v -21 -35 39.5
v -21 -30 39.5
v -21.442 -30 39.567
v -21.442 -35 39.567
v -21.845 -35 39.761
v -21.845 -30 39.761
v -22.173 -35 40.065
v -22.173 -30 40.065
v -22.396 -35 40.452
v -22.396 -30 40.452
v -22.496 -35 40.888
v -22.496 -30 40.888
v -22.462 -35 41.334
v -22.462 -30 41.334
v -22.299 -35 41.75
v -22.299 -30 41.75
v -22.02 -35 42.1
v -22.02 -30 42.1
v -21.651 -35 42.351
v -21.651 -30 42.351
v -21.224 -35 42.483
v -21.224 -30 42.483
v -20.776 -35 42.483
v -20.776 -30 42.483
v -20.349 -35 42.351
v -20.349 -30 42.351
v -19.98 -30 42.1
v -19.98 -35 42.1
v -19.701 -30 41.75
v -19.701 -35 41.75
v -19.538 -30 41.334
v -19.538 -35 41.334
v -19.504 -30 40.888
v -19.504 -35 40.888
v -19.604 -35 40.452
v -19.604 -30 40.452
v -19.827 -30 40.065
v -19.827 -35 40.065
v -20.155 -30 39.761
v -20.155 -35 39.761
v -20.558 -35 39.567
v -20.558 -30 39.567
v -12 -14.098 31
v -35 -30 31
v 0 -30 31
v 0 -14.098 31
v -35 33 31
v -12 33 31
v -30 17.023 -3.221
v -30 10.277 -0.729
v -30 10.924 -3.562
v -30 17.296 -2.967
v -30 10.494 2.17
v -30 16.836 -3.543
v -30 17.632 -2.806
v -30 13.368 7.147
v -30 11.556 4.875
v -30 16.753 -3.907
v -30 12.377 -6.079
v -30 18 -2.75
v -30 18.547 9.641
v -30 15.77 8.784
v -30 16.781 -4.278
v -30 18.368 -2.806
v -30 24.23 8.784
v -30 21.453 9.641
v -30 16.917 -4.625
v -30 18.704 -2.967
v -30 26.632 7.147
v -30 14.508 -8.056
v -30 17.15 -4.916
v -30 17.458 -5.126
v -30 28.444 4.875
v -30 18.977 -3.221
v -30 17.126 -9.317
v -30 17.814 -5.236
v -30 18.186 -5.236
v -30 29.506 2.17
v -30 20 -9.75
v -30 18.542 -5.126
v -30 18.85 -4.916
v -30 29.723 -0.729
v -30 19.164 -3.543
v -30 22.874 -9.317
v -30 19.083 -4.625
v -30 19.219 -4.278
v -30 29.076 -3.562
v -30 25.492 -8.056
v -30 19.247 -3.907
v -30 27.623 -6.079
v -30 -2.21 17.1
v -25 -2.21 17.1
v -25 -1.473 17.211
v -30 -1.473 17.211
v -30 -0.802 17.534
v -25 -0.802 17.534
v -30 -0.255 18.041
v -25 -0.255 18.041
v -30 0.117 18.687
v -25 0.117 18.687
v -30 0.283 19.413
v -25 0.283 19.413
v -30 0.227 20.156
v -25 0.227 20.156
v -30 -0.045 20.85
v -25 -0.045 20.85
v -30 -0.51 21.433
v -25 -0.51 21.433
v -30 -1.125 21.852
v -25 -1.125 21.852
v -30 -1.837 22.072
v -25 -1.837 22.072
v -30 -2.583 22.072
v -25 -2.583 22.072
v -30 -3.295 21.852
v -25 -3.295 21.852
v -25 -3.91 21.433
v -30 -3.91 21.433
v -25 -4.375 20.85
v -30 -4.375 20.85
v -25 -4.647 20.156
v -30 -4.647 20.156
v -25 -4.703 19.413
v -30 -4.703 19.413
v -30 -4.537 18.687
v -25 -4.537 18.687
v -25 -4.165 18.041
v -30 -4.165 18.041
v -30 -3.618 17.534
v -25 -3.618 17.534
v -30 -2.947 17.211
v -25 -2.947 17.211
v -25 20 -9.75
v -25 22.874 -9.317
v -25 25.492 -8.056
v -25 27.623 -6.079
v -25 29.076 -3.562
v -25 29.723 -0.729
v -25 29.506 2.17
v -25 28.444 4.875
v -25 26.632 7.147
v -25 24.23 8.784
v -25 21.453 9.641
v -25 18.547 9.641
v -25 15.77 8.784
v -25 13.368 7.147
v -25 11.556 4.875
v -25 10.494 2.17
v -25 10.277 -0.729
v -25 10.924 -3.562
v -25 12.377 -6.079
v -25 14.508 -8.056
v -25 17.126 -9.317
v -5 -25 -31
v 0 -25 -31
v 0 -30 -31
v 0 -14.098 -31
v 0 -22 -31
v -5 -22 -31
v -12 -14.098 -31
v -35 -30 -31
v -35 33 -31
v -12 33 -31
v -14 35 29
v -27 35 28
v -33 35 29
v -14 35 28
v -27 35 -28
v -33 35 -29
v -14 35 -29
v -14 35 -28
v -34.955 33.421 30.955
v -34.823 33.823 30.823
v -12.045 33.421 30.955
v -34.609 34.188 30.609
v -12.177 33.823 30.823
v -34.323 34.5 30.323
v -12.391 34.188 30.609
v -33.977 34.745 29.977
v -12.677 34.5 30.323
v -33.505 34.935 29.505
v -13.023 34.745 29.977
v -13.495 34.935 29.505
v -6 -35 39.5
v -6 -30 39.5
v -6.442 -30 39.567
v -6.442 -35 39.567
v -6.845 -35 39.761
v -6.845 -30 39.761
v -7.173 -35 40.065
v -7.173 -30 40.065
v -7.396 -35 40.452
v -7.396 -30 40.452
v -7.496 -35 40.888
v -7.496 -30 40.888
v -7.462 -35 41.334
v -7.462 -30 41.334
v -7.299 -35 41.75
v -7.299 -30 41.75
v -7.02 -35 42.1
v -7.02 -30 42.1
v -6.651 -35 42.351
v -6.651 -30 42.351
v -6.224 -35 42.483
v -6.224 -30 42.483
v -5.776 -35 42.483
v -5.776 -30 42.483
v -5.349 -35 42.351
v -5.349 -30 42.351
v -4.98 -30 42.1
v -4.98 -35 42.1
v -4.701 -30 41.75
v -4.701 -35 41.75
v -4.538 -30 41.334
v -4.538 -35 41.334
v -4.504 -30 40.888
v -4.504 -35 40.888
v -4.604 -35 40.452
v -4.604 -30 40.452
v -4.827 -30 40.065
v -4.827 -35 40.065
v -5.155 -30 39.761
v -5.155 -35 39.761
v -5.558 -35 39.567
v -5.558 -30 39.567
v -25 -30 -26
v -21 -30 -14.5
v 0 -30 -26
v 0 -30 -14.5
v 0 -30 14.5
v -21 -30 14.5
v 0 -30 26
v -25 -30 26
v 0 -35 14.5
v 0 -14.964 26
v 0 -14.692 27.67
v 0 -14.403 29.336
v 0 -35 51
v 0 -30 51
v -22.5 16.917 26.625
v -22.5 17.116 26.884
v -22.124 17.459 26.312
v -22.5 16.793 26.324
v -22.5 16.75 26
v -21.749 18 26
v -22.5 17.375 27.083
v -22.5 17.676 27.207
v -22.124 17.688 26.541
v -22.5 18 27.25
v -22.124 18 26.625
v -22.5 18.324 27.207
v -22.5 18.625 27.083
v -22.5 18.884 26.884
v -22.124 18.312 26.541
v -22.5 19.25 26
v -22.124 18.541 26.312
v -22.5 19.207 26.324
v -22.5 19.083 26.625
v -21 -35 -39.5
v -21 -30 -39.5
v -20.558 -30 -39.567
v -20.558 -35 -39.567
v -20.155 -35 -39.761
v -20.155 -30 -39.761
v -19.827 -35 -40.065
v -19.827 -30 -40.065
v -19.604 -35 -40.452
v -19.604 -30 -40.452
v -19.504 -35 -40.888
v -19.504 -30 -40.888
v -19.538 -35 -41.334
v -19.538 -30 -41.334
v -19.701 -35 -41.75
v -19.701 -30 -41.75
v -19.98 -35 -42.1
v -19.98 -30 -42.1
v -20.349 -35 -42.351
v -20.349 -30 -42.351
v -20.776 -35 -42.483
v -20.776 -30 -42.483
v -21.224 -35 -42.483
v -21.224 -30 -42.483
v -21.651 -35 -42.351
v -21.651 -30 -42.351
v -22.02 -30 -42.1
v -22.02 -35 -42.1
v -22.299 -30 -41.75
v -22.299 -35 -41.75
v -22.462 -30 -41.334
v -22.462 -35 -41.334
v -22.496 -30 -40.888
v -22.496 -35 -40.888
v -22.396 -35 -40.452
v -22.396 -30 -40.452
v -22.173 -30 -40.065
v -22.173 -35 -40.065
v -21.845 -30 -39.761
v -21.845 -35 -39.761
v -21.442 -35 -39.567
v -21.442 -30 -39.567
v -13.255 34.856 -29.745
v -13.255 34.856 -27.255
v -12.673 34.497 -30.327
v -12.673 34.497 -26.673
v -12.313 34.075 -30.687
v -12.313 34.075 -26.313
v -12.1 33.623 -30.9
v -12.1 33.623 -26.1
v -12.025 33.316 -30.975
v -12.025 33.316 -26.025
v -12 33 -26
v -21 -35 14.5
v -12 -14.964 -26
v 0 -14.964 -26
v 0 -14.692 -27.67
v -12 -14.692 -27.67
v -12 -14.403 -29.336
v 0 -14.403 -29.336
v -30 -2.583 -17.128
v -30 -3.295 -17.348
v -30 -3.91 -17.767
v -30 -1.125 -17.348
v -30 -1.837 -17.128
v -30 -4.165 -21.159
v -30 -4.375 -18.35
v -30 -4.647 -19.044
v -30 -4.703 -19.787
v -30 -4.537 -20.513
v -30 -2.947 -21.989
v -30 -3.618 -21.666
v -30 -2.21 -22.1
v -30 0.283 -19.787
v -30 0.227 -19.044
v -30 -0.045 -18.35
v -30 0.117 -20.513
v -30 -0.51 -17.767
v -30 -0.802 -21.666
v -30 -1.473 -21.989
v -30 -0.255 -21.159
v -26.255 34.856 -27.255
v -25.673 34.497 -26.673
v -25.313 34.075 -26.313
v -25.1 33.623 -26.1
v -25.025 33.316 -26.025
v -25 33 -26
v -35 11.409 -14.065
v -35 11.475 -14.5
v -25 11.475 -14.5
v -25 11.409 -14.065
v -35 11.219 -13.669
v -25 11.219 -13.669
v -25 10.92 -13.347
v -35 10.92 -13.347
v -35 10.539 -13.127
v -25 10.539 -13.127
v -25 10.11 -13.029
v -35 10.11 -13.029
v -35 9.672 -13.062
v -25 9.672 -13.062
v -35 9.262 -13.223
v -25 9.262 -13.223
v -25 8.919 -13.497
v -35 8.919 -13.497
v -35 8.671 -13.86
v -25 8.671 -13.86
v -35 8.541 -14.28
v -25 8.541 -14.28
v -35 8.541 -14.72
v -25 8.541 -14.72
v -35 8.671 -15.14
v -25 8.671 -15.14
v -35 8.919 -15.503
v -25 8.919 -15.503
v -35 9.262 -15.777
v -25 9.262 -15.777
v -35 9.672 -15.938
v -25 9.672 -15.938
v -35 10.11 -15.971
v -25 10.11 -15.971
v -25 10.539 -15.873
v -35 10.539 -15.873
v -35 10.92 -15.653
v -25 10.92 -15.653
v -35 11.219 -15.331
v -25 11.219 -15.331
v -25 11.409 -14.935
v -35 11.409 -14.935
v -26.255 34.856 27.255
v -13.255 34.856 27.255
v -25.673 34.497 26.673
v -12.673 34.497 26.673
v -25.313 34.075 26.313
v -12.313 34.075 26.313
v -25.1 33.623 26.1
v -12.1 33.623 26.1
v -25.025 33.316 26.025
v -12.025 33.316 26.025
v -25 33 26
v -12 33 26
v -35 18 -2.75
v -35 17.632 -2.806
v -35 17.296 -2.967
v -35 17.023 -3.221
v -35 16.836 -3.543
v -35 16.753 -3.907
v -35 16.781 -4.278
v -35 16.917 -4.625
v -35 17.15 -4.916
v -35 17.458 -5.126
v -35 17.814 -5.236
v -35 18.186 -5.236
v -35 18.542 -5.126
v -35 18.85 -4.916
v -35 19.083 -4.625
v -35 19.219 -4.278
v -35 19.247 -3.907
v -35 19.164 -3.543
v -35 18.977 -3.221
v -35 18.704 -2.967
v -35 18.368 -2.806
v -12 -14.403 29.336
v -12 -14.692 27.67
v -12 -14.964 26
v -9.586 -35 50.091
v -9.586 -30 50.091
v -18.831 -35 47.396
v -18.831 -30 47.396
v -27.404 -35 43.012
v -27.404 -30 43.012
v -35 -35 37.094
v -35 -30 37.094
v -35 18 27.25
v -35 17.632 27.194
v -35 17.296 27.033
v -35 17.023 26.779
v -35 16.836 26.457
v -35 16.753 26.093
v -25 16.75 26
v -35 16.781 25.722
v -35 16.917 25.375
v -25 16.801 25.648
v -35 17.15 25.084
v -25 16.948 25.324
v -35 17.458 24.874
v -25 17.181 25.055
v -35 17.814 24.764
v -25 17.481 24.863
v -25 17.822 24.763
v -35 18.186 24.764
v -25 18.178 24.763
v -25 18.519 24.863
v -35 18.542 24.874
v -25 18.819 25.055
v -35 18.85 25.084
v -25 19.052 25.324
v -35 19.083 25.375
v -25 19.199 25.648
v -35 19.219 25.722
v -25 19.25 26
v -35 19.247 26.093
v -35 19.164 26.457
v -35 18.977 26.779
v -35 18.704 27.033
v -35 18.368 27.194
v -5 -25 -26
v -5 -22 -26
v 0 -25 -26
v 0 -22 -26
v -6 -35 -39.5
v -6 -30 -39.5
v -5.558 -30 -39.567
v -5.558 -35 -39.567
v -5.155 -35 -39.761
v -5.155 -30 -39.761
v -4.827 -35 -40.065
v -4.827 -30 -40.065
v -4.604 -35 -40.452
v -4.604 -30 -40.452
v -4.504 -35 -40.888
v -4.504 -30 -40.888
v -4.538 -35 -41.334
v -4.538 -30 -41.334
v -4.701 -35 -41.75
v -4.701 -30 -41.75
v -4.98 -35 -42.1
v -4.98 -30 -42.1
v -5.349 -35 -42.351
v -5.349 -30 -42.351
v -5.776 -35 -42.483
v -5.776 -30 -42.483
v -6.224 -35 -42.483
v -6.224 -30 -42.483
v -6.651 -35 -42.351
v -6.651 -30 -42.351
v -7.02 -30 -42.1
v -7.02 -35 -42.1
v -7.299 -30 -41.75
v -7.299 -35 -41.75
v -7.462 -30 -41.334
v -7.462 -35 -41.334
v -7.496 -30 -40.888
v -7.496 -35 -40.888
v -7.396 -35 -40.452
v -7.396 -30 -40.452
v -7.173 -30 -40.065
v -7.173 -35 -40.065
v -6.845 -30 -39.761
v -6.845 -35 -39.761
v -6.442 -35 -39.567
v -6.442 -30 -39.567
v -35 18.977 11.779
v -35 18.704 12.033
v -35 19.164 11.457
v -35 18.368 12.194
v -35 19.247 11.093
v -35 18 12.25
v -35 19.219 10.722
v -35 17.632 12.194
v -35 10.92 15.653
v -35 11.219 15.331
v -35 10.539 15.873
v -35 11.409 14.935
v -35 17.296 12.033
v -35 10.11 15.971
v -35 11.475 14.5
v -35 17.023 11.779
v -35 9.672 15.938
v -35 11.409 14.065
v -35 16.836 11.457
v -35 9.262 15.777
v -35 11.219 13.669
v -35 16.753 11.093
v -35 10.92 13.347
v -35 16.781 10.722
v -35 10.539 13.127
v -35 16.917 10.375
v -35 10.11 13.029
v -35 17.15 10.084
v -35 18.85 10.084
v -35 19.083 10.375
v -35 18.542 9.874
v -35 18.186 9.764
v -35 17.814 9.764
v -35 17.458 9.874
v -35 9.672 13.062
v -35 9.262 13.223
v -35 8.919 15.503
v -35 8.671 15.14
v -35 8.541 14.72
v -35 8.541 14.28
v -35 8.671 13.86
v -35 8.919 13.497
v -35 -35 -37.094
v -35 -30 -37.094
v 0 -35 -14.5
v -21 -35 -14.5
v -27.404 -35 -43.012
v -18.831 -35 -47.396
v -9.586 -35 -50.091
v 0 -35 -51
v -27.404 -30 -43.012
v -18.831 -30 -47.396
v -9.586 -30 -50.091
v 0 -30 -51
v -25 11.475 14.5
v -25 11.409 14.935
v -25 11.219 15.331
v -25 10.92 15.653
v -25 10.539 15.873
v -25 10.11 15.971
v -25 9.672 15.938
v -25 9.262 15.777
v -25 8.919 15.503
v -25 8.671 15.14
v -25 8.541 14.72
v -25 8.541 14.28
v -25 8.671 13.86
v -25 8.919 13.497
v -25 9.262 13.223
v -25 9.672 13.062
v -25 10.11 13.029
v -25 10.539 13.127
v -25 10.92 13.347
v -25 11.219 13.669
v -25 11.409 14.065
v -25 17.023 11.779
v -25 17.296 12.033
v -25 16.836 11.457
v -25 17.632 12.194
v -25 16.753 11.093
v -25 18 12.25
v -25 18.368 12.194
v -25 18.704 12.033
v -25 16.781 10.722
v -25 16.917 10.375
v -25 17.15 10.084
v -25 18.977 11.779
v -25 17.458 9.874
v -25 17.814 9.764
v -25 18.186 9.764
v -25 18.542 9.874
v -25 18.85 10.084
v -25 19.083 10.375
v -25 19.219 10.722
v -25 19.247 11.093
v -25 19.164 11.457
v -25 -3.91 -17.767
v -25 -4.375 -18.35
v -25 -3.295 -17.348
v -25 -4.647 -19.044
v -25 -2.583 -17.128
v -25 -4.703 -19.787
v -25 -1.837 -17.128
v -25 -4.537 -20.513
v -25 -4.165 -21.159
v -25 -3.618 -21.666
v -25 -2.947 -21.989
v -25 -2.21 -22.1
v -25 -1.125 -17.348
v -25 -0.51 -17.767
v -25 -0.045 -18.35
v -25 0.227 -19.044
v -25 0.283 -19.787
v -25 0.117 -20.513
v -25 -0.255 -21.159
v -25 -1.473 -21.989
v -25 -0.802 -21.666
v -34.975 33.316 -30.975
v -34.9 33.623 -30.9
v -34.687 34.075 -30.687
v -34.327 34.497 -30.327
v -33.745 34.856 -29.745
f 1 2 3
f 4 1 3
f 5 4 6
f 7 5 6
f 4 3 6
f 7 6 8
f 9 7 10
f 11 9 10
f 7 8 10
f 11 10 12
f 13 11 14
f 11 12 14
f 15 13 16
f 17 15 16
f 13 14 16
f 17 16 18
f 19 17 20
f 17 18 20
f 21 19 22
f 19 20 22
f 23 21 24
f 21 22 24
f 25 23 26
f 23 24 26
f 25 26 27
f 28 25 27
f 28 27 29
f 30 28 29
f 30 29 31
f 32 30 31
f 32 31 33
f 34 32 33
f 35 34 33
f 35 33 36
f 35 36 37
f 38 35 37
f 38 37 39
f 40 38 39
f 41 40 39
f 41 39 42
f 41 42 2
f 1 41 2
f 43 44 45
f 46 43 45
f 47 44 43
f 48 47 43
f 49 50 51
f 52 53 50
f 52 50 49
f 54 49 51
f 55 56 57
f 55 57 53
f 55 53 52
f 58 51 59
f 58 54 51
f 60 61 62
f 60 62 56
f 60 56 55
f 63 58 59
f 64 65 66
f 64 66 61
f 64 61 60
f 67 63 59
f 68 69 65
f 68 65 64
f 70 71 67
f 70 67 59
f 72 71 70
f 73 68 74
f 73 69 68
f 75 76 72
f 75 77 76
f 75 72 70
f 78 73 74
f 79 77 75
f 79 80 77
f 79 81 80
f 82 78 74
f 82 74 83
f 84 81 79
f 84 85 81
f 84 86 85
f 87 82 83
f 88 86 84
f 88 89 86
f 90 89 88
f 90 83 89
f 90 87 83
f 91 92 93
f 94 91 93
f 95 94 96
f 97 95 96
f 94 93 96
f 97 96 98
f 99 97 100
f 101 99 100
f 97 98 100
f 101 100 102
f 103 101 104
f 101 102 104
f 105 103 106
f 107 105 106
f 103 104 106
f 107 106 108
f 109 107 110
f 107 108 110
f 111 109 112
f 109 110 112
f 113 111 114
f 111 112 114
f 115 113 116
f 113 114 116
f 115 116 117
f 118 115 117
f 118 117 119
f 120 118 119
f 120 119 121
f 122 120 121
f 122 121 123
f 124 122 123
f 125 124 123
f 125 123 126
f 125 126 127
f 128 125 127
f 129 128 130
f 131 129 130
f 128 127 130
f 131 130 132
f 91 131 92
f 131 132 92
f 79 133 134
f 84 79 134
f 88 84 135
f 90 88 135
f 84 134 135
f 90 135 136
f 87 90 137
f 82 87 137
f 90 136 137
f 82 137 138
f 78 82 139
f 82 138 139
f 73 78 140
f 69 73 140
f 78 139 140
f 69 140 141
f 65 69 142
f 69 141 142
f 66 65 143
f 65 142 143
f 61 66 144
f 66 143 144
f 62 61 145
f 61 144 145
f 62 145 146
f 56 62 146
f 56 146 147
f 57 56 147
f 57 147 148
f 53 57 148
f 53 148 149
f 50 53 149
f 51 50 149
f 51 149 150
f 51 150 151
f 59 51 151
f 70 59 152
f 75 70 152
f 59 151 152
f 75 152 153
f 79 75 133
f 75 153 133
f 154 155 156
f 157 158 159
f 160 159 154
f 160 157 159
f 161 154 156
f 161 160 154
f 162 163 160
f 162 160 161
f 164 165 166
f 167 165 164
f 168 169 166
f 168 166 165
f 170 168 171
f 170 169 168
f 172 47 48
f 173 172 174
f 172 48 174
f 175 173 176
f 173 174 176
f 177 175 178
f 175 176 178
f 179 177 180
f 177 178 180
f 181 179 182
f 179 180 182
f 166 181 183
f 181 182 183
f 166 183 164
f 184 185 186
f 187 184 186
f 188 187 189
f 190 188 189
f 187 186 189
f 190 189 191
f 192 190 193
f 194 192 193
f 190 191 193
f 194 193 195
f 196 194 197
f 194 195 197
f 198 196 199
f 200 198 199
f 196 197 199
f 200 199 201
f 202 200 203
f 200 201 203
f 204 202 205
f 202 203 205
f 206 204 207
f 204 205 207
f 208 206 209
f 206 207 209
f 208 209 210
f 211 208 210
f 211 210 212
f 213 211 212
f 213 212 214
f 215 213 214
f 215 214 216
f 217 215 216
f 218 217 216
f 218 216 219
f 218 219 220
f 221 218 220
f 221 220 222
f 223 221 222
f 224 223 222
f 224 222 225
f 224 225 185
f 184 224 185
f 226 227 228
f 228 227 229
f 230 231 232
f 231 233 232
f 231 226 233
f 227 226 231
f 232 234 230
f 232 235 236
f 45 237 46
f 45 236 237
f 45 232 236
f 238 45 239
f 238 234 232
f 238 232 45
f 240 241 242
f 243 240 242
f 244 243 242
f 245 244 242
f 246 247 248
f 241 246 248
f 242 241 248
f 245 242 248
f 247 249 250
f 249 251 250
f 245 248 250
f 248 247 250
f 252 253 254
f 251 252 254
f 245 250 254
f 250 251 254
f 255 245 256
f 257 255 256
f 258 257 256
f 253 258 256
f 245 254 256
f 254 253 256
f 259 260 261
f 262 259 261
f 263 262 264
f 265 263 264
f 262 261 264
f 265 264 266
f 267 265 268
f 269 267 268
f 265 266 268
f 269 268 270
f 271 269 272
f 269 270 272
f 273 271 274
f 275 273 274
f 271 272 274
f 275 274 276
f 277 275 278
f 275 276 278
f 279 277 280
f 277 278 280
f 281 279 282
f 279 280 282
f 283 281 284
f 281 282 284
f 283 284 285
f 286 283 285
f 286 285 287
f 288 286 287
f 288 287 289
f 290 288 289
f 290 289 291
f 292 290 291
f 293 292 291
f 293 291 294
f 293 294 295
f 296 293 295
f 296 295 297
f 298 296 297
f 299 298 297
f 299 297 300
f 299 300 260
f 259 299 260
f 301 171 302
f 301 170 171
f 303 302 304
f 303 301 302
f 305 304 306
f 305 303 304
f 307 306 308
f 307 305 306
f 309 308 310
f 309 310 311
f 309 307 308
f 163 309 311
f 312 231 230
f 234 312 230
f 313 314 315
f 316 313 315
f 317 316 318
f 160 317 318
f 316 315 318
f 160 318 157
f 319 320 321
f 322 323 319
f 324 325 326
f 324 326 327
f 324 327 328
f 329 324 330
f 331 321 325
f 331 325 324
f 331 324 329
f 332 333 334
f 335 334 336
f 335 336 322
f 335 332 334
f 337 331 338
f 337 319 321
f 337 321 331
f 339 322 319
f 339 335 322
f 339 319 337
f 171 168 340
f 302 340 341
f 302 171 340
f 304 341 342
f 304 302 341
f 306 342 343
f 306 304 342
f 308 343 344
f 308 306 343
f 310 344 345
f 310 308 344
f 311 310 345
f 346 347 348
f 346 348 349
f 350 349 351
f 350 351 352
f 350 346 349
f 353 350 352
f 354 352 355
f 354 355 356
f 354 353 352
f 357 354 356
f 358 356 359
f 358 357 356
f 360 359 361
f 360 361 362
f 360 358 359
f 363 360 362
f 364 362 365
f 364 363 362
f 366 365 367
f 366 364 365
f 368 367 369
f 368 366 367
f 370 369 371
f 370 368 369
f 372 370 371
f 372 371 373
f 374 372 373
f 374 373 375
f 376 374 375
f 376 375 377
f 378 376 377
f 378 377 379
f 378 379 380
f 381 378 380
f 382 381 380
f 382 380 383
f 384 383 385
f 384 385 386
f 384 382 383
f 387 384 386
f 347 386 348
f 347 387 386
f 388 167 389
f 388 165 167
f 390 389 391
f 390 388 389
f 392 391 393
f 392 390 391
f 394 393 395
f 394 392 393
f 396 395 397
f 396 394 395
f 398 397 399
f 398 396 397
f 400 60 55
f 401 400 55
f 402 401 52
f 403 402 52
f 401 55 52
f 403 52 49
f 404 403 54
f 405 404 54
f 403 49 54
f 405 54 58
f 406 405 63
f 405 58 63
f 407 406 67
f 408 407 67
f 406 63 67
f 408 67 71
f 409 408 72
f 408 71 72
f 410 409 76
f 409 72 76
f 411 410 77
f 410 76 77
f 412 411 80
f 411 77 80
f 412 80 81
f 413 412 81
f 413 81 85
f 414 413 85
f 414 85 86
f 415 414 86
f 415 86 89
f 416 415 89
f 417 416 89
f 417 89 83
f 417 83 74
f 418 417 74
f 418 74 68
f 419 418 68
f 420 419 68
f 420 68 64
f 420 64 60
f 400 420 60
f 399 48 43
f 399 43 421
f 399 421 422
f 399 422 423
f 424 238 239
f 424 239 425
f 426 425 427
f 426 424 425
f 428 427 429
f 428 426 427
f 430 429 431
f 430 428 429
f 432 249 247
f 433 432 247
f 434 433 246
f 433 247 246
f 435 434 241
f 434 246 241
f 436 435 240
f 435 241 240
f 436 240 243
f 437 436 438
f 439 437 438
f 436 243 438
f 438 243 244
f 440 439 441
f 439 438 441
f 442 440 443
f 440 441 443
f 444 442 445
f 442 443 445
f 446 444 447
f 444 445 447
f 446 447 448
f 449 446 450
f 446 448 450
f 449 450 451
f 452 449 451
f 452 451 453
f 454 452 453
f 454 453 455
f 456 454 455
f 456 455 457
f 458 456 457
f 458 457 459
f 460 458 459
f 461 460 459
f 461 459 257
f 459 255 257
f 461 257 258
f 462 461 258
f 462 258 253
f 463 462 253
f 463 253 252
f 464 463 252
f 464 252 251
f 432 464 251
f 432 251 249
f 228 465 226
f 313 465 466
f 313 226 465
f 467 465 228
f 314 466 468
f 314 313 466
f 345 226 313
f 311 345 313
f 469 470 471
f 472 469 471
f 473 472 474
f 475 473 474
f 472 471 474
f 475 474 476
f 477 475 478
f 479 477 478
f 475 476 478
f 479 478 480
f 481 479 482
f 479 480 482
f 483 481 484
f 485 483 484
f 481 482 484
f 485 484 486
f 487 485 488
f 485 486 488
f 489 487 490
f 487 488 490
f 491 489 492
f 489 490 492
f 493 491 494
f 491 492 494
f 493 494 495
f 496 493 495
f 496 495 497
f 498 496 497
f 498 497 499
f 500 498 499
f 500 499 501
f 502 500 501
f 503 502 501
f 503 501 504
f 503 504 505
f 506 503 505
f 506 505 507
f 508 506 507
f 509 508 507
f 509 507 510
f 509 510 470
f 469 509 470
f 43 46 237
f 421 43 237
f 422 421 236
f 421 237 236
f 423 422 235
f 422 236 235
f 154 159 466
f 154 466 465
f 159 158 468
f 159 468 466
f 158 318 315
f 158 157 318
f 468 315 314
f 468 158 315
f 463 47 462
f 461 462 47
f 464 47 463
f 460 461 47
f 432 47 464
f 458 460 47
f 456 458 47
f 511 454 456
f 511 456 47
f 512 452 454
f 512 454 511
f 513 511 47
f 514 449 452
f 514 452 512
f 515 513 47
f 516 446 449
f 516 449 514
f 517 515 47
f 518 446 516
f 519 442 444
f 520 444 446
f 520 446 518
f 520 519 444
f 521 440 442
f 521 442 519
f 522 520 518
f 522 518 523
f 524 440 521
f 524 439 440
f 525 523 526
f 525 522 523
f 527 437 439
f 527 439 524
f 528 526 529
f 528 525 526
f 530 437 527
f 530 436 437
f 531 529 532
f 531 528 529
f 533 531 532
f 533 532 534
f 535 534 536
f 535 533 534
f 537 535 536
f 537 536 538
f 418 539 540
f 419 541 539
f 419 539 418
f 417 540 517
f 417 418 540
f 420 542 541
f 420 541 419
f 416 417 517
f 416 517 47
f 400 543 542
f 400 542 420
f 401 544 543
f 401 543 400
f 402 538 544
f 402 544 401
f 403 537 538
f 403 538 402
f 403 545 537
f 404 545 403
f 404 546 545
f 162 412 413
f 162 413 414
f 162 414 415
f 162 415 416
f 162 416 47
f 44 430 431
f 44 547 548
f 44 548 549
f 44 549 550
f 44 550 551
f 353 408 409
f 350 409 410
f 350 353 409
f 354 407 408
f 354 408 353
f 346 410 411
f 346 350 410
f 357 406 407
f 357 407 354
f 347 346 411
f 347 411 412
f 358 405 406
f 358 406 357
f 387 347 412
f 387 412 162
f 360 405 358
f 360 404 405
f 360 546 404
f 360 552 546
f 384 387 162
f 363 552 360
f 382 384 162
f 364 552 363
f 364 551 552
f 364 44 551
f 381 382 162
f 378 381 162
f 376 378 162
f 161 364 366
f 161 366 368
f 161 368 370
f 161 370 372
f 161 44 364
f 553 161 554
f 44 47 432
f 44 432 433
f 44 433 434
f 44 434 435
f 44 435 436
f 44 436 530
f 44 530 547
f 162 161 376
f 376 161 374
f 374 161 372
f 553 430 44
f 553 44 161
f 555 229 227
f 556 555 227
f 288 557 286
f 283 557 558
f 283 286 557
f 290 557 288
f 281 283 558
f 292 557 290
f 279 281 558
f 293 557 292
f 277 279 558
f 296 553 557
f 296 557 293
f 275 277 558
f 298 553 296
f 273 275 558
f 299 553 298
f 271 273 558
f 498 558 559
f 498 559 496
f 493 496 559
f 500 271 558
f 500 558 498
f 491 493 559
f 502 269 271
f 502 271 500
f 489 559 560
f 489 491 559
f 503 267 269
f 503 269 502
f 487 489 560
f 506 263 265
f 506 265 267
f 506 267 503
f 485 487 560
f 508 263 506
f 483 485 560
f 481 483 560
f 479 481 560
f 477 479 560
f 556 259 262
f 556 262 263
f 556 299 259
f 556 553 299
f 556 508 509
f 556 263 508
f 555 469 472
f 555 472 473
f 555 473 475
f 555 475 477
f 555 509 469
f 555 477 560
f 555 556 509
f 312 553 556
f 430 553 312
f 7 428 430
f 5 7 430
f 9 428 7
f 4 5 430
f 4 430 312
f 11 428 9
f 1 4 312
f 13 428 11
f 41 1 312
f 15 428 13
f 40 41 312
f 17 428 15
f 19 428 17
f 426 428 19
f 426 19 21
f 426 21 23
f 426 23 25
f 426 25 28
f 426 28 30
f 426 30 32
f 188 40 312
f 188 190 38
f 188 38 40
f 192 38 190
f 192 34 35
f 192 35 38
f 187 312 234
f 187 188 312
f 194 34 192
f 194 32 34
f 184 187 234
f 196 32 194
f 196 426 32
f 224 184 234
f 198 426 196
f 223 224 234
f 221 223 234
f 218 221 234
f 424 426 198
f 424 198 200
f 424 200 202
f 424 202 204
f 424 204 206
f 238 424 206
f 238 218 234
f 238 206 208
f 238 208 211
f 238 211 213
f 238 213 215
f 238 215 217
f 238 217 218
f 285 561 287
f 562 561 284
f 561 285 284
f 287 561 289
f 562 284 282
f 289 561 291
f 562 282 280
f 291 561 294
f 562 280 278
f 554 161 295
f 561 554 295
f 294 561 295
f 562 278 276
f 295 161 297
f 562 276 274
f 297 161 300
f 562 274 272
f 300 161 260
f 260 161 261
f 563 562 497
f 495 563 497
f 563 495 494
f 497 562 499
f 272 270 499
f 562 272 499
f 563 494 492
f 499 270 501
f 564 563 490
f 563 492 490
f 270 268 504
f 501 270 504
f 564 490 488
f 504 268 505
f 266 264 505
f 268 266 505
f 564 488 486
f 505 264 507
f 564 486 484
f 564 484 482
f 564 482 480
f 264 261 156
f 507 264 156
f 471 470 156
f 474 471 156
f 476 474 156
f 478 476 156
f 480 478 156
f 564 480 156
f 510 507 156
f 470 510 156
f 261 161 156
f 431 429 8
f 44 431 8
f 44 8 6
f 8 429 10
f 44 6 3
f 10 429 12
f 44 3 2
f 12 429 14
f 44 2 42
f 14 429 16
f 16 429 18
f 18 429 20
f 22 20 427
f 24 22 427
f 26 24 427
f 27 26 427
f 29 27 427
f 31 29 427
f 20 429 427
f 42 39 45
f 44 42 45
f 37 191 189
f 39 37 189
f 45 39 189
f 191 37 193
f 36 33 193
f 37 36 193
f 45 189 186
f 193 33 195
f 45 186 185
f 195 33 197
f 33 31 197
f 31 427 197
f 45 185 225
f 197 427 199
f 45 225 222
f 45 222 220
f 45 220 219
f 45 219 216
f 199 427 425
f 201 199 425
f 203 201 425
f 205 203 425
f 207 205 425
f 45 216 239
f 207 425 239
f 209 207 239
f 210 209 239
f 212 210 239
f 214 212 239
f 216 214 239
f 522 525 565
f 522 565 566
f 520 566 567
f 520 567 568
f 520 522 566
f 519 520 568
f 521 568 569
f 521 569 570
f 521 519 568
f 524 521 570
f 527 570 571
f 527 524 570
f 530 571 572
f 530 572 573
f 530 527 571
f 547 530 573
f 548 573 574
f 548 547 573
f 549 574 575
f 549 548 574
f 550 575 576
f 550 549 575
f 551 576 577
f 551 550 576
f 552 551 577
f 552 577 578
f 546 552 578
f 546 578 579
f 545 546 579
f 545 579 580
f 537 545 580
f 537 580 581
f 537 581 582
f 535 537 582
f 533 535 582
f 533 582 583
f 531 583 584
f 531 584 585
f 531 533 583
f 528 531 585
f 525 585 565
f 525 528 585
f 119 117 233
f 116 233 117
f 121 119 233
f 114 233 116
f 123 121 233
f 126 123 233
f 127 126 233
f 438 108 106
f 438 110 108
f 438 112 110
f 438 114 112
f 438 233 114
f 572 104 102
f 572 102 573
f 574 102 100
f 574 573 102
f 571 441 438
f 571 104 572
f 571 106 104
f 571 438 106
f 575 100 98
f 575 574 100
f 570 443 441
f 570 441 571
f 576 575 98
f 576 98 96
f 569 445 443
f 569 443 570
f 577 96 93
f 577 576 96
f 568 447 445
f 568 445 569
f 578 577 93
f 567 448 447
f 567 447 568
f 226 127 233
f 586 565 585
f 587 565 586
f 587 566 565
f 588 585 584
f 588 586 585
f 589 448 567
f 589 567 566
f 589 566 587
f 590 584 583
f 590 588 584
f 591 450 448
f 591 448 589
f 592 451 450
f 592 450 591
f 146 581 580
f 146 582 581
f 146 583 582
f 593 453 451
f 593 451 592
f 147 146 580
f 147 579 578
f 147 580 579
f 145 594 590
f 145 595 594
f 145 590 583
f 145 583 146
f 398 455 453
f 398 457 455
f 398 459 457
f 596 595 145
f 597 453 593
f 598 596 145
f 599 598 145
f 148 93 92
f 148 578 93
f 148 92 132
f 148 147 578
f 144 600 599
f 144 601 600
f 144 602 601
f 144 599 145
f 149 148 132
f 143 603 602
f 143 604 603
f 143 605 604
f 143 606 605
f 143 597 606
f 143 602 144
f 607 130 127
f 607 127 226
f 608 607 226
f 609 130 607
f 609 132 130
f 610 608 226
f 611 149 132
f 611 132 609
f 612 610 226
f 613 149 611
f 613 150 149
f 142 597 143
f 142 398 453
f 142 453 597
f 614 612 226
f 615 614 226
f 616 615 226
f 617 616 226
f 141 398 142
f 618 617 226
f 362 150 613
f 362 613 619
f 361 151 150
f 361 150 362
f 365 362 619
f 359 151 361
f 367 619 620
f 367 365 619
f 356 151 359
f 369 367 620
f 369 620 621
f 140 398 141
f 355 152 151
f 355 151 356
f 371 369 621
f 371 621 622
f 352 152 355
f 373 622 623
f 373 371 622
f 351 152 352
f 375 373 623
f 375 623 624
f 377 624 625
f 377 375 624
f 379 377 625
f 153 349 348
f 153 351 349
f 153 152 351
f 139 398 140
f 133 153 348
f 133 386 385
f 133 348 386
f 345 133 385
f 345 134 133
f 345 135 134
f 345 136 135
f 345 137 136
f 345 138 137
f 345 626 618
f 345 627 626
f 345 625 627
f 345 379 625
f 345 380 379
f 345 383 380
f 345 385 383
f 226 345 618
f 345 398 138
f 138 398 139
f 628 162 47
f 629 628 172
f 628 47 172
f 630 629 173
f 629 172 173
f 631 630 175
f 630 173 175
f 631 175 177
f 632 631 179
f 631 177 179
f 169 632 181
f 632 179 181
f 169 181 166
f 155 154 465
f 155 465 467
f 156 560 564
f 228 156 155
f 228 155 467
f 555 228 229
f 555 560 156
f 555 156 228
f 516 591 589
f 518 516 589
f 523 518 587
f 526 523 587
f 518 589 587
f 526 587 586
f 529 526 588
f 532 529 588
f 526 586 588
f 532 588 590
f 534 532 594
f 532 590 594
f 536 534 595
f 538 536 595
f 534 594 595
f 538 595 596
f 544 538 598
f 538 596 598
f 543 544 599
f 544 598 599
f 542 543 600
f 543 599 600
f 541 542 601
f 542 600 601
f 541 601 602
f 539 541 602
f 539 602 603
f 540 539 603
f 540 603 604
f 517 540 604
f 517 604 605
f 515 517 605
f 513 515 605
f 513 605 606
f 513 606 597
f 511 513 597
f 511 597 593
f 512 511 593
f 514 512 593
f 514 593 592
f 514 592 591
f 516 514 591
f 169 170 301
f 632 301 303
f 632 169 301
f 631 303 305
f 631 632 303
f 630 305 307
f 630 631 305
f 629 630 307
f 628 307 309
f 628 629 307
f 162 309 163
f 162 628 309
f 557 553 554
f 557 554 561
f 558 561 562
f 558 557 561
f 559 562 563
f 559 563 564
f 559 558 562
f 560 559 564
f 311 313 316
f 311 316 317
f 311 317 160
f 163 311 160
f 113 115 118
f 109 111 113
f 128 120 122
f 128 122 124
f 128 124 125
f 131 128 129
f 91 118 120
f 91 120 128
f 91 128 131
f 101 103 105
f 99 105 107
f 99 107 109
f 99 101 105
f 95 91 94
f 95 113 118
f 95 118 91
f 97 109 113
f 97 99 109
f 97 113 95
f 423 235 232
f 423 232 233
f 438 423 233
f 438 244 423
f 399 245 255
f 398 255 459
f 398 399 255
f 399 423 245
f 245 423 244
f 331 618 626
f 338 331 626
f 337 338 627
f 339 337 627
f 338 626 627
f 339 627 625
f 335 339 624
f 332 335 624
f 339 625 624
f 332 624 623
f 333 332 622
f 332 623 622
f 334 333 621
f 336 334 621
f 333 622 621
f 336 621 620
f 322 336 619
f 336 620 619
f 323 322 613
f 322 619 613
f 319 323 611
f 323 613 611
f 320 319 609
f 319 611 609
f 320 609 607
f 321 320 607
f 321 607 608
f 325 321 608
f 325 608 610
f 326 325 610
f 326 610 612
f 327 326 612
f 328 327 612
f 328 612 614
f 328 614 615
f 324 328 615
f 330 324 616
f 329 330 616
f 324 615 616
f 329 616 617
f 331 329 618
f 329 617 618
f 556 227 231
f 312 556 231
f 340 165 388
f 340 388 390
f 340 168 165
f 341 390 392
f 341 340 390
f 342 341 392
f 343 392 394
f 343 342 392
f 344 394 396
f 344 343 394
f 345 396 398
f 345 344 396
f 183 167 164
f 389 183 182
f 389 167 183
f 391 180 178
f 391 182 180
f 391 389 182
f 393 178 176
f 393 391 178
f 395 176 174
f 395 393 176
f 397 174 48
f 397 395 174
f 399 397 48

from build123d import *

# Parameters (mm, degrees)
BOSS_EXTRU_7_DEPTH          = 35
BOSS_EXTRU_8_DEPTH          = 5
ESQUISSE3_R                 = 2.5
ENL_V_MAT_EXTRU_1_DEPTH     = 5
ENL_V_MAT_EXTRU_2_DEPTH     = 12
ESQUISSE6_R                 = 9.75
ENL_V_MAT_EXTRU_3_DEPTH     = 5
CONG_1_R                    = 2
ESQUISSE8_R                 = 1.5
ENL_V_MAT_EXTRU_5_DEPTH     = 90.727364834
TROU_TARAUD_M31_D           = 2.5
TROU_TARAUD_M31_DEPTH       = 12.5
TROU_TARAUD_M31_TIP         = 0.751075774
ENL_V_START                 = -35
ENL_V_MAT_EXTRU_6_OUTLINE_R = 1.475
ENL_V_MAT_EXTRU_6_DEPTH     = 10
ENL_V_MAT_EXTRU_7_DEPTH     = 99.692704898
ENL_V_MAT_EXTRU_8_DEPTH     = 10


# Read off the part's stored shape, not the designer's step: Enlèv. mat.-Extru.6
with BuildPart() as part:
    # Esquisse1 → Boss.-Extru.7 (new, symmetric)
    with BuildSketch(Plane(origin=(0, 0, 0), x_dir=(1, 0, 0), z_dir=(0, 1, 0))):
        Polygon((-35, 31), (-35, -31), (0, -31), (0, -26), (-25, -26), (-25, -22.1), (-25, -17.1), (-25, 17.1), (-25, 22.1), (-25, 26), (0, 26), (0, 31), align=None)
    extrude(amount=BOSS_EXTRU_7_DEPTH, both=True)

    # Esquisse2 → Boss.-Extru.8 (add)
    with BuildSketch(Plane.XZ.offset(35)):
        with BuildLine():
            Line((-35, 37.094473982), (-35, -37.094473982))
            ThreePointArc((-35, -37.094473982), (-18.830584523, -47.396298237), (0, -51))
            Line((0, -51), (0, 51))
            ThreePointArc((0, 51), (-18.830584523, 47.396298237), (-35, 37.094473982))
        make_face()
    extrude(amount=-BOSS_EXTRU_8_DEPTH)

    # Esquisse3 → Enlèv. mat.-Extru.1 (cut)
    with BuildSketch(Plane(origin=(-25, 0, 0), x_dir=(0, 0, -1), z_dir=(1, 0, 0))):
        with Locations((-19.6, -2.21)):
            Circle(ESQUISSE3_R)
        with Locations((19.6, -2.21)):
            Circle(ESQUISSE3_R)
    extrude(amount=-ENL_V_MAT_EXTRU_1_DEPTH, mode=Mode.SUBTRACT)

    # Esquisse5 → Enlèv. mat.-Extru.2 (cut)
    with BuildSketch(Plane(origin=(0, 0, 0), x_dir=(0, 0, -1), z_dir=(1, 0, 0))):
        with BuildLine():
            Line((98.051206934, 14.815086571), (40.674477228, 51.032394683))
            ThreePointArc((40.674477228, 51.032394683), (34.260412481, 48.633219758), (27.706013605, 46.649253461))
            ThreePointArc((27.706013605, 46.649253461), (-0.631861598, 43.001865666), (-28.924683694, 46.983677637))
            ThreePointArc((-28.924683694, 46.983677637), (-34.858411147, 48.837303455), (-40.674477228, 51.032394683))
            Line((-40.674477228, 51.032394683), (-98.051206934, 14.815086571))
            ThreePointArc((-98.051206934, 14.815086571), (-66.125172065, -3.350779651), (-31, -14.097531974))
            Line((-31, -14.097531974), (-31, 35))
            Line((-31, 35), (-26, 35))
            Line((-26, 35), (-26, -14.963632356))
            ThreePointArc((-26, -14.963632356), (0, -17), (26, -14.963632356))
            Line((26, -14.963632356), (26, 35))
            Line((26, 35), (31, 35))
            Line((31, 35), (31, -14.097531974))
            ThreePointArc((31, -14.097531974), (66.125172065, -3.350779651), (98.051206934, 14.815086571))
        make_face()
        with BuildLine():
            ThreePointArc((-31, -14.097531974), (-28.503289853, -14.549574498), (-26, -14.963632356))
            Line((-26, -14.963632356), (-26, 35))
            Line((-26, 35), (-31, 35))
            Line((-31, 35), (-31, -14.097531974))
        make_face()
        with BuildLine():
            ThreePointArc((26, -14.963632356), (28.503289853, -14.549574498), (31, -14.097531974))
            Line((31, -14.097531974), (31, 35))
            Line((31, 35), (26, 35))
            Line((26, 35), (26, -14.963632356))
        make_face()
    extrude(amount=-ENL_V_MAT_EXTRU_2_DEPTH, mode=Mode.SUBTRACT)

    # Esquisse6 → Enlèv. mat.-Extru.3 (cut)
    with BuildSketch(Plane(origin=(-25, 0, 0), x_dir=(0, 0, -1), z_dir=(1, 0, 0))):
        with Locations((0, 20)):
            Circle(ESQUISSE6_R)
    extrude(amount=-ENL_V_MAT_EXTRU_3_DEPTH, mode=Mode.SUBTRACT)

    # Congé1
    cong_1_edges = [part.edges().sort_by_distance(p)[0] for p in [
        (-23.5, 35, 31),
        (-18.5, 35, 26),
        (-25, 35, 0),
        (-18.5, 35, -26),
        (-23.5, 35, -31),
        (-12, 35, -28.5),
        (-12, 35, 28.5),
        (-35, 35, 0),
    ]]
    fillet(cong_1_edges, radius=CONG_1_R)

    # Esquisse8 → Enlèv. mat.-Extru.5 (cut, through all)
    with BuildSketch(Plane(origin=(0, -30, 0), x_dir=(1, 0, 0), z_dir=(0, 1, 0))):
        with Locations(Location((-21, 41, 0), (0, 0, 270))):
            Circle(ESQUISSE8_R)
        with Locations(Location((-6, 41, 0), (0, 0, 270))):
            Circle(ESQUISSE8_R)
        with Locations(Location((-6, -41, 0), (0, 0, 90))):
            Circle(ESQUISSE8_R)
        with Locations(Location((-21, -41, 0), (0, 0, 90))):
            Circle(ESQUISSE8_R)
    extrude(amount=-ENL_V_MAT_EXTRU_5_DEPTH, mode=Mode.SUBTRACT)

    # Trou taraudé M31
    with Locations(Plane(origin=(-35, 18, -4), x_dir=(0, 0, -1), z_dir=(-1, 0, 0))):
        with Locations((0, 0), (-15, 0), (-30, 0)):
            Hole(TROU_TARAUD_M31_D / 2, depth=TROU_TARAUD_M31_DEPTH)
            with Locations((0, 0, -(TROU_TARAUD_M31_DEPTH + TROU_TARAUD_M31_TIP / 2))):  # 118° drill point
                Cone(0, TROU_TARAUD_M31_D / 2, TROU_TARAUD_M31_TIP, mode=Mode.SUBTRACT)

    # Enlèv. mat.-Extru.6 outline → Enlèv. mat.-Extru.6 (cut)
    with BuildSketch(Plane.YZ.offset(ENL_V_START)):
        with Locations((10, -14.5)):
            Circle(ENL_V_MAT_EXTRU_6_OUTLINE_R)
        with Locations((10, 14.5)):
            Circle(ENL_V_MAT_EXTRU_6_OUTLINE_R)
    extrude(amount=ENL_V_MAT_EXTRU_6_DEPTH, mode=Mode.SUBTRACT)

    # Esquisse3D3 → Enlèv. mat.-Extru.7 (cut, through all)
    with BuildSketch(Plane(origin=(0, -30, -14.5), x_dir=(-0.586509812151843, 0, 0.8099421215430211), z_dir=(0, -1, 0))):
        Polygon((0, 0), (12.316706055, 17.008784552), (35.80502758, 0), (23.488321525, -17.008784552), align=None)
    extrude(amount=ENL_V_MAT_EXTRU_7_DEPTH, mode=Mode.SUBTRACT)

    # Esquisse3D4 → Enlèv. mat.-Extru.8 (cut)
    with BuildSketch(Plane(origin=(0, -22, -31), x_dir=(-0.8574929257125444, -0.5144957554275261, 0), z_dir=(0, 0, -1))):
        Polygon((0, 0), (4.287464629, 2.572478777), (5.830951895, 0), (1.543487266, -2.572478777), align=None)
    extrude(amount=-ENL_V_MAT_EXTRU_8_DEPTH, mode=Mode.SUBTRACT)


solid = part.part
